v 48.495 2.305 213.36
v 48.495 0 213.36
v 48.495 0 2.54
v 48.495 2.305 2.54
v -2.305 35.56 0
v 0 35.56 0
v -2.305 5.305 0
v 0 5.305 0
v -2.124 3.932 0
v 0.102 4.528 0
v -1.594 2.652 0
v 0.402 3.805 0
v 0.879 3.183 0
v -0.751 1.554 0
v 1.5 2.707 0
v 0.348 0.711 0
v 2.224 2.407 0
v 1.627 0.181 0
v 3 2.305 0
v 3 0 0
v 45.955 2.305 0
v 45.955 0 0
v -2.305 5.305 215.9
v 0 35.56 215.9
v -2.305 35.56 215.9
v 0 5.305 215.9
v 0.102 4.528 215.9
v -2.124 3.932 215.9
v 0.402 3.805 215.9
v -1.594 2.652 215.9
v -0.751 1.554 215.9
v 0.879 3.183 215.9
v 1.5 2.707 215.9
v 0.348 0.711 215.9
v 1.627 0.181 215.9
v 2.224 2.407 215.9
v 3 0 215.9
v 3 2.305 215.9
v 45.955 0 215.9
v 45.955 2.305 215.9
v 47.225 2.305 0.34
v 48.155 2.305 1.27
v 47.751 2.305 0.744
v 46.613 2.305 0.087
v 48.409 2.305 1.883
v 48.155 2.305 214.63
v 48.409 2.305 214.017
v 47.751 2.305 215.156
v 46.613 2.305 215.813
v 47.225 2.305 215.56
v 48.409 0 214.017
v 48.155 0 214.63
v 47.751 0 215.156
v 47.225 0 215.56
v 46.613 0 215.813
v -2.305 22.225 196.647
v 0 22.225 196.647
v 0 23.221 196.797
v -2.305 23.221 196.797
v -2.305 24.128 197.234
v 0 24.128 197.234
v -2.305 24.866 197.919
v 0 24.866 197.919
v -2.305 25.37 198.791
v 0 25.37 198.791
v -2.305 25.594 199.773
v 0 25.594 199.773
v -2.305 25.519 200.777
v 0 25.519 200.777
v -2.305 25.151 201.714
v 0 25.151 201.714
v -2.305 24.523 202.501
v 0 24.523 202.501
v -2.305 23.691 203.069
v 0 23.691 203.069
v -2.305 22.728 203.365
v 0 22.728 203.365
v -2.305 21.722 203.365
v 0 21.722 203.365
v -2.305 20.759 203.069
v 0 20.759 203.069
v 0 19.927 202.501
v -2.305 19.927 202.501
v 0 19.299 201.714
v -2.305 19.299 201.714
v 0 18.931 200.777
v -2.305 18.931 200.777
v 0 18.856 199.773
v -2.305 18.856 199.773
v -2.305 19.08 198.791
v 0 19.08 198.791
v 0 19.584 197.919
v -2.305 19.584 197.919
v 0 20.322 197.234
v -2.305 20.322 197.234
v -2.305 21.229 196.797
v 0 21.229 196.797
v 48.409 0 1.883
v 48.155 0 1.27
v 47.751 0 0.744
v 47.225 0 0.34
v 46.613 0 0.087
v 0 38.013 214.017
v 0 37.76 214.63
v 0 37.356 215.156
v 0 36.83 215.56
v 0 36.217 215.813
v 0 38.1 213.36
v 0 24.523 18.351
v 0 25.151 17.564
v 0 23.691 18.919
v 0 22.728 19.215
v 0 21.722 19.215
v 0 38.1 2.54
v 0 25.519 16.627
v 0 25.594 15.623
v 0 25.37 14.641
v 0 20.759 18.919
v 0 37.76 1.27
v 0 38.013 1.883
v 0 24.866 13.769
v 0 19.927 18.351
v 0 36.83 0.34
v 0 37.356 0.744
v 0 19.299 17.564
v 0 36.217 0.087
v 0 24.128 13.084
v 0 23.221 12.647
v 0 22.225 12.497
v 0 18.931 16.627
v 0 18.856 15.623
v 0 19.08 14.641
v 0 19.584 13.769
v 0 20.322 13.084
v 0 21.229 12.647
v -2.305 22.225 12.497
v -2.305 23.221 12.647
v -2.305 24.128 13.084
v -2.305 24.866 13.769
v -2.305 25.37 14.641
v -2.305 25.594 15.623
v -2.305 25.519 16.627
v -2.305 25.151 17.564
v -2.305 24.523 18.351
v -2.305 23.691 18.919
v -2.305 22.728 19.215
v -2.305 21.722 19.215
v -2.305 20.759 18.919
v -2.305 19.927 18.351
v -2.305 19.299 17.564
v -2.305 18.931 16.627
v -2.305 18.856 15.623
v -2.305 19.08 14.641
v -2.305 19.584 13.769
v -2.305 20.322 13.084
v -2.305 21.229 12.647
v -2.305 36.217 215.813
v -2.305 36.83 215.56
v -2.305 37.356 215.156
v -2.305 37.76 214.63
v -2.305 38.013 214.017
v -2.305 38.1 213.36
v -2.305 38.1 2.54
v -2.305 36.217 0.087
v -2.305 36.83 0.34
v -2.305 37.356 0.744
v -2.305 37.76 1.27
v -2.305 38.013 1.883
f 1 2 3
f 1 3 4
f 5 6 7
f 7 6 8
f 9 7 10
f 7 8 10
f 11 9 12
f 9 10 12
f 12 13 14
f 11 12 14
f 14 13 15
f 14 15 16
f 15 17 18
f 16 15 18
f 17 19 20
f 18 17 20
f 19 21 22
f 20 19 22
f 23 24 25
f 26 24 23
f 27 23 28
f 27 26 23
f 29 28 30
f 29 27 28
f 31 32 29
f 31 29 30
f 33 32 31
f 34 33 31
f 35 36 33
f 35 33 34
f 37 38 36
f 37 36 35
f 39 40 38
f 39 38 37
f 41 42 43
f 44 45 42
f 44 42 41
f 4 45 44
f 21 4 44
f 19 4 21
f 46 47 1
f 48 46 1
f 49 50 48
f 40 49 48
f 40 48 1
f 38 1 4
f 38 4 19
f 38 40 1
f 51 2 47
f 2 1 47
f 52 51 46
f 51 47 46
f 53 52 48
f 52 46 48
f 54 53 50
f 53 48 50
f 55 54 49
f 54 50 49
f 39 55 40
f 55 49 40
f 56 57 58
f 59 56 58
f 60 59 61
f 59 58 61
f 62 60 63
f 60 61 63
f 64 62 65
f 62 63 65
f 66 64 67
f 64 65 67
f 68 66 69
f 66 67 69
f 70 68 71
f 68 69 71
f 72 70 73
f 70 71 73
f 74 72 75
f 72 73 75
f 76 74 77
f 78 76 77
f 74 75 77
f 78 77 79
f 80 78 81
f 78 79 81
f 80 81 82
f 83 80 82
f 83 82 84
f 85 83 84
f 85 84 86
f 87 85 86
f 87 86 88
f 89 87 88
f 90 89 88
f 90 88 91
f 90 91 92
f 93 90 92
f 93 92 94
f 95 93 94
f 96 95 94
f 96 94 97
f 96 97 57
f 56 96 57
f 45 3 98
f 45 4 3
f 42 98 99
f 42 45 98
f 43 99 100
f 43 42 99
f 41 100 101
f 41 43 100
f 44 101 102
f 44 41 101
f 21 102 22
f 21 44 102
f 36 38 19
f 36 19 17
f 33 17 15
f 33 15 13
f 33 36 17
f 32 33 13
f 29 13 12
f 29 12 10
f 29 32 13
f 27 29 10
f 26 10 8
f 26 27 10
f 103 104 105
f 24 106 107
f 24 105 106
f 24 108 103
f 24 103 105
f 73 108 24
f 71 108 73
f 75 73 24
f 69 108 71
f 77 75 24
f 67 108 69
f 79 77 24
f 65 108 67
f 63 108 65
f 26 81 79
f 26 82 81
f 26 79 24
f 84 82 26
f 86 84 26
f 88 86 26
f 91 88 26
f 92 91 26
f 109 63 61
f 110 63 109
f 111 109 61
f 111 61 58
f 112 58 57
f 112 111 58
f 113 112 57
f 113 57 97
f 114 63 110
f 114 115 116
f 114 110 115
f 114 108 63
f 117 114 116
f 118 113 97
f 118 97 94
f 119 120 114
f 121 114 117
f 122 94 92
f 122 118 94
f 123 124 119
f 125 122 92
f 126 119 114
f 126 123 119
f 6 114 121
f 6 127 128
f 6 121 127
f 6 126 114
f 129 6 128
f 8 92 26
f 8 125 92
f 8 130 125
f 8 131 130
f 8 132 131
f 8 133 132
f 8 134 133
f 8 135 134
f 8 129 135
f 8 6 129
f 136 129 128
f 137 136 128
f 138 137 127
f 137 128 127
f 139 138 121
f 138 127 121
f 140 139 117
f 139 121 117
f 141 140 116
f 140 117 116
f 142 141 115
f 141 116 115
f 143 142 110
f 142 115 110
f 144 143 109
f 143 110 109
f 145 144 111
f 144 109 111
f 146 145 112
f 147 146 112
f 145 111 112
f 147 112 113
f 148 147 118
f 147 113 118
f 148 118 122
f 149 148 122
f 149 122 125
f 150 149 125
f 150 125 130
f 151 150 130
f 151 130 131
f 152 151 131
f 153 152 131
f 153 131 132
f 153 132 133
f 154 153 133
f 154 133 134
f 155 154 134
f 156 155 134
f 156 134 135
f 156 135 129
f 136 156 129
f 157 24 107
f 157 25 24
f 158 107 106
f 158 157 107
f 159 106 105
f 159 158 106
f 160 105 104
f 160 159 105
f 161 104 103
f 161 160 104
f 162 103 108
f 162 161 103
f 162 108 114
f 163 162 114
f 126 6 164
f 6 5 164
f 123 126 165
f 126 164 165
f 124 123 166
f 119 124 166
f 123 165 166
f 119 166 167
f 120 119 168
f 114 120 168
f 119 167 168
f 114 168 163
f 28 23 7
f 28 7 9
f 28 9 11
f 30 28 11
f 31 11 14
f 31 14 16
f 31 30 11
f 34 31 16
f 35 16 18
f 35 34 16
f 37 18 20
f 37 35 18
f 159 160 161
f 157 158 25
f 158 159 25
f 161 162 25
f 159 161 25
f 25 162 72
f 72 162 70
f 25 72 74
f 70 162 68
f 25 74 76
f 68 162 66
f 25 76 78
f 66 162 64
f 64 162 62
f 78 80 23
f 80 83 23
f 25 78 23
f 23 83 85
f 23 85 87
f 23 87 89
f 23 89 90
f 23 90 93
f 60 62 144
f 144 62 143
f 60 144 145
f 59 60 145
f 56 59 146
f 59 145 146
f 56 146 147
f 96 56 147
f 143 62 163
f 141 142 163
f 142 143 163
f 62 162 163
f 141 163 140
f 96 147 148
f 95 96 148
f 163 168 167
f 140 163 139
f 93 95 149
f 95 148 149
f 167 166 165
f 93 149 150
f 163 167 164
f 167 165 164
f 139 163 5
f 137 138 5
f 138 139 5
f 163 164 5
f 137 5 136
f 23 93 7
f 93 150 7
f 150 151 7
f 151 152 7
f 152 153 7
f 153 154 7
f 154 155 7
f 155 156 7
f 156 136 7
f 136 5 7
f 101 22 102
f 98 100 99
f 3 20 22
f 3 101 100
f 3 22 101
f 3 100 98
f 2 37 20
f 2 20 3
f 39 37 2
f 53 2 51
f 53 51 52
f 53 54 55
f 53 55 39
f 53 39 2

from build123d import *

# Parameters (mm, degrees)
SKETCH1_W                    = 38.1
SKETCH1_H                    = 215.9
BASE_FLANGE1_DEPTH           = 2.304796
EDGE_FLANGE1_STRIP_W         = 15.219184
EDGE_FLANGE1_STRIP_H         = 2.304796
EDGE_FLANGE1_STRIP_CUT_DEPTH = 215.9
EDGE_FLANGE1_DEPTH           = 215.9
F_1_4_CLEARANCE_HOLE1_D      = 6.7564
FILLET1_R                    = 2.54


# Sheet-metal steps are written as plain solids
with BuildPart() as part:
    # Sketch1 → Base-Flange1 (new body)
    with BuildSketch(Plane(origin=(0, 0, 0), x_dir=(0, -1, 0), z_dir=(1, 0, 0))):
        with Locations((-19.05, -107.95)):
            Rectangle(SKETCH1_W, SKETCH1_H)
    extrude(amount=-BASE_FLANGE1_DEPTH)

    # Edge-Flange1 strip (across the edge) → Edge-Flange1 strip cut (cut)
    with BuildSketch(Plane.YX.offset(-215.9)):
        with Locations((-2.304796, -1.152398)):
            Rectangle(EDGE_FLANGE1_STRIP_W, EDGE_FLANGE1_STRIP_H)
    extrude(amount=EDGE_FLANGE1_STRIP_CUT_DEPTH, mode=Mode.SUBTRACT)

    # Edge-Flange1 section (across the edge) → Edge-Flange1 (add)
    with BuildSketch(Plane.YX.offset(-215.9)):
        with BuildLine():
            Line((0, 3), (0, 48.495204))
            Line((0, 48.495204), (2.304796, 48.495204))
            Line((2.304796, 48.495204), (2.304796, 3))
            ThreePointArc((2.304796, 3), (3.183475656, 0.878679656), (5.304796, 0))
            Line((5.304796, 0), (5.304796, -2.304796))
            ThreePointArc((5.304796, -2.304796), (1.553738776, -0.751057224), (0, 3))
        make_face()
    extrude(amount=EDGE_FLANGE1_DEPTH)

    # 1/4 Clearance Hole1 (through all)
    with Locations(Plane.ZY.offset(2.304796)):
        with Locations((15.875, 22.225), (200.025, 22.225)):
            Hole(F_1_4_CLEARANCE_HOLE1_D / 2)

    # Fillet1
    fillet1_edges = [part.edges().sort_by_distance(p)[0] for p in [
        (48.495204, 1.152398, 215.9),
        (48.495204, 1.152398, 0),
        (-1.152398, 38.1, 215.9),
        (-1.152398, 38.1, 0),
    ]]
    fillet(fillet1_edges, radius=FILLET1_R)


solid = part.part
